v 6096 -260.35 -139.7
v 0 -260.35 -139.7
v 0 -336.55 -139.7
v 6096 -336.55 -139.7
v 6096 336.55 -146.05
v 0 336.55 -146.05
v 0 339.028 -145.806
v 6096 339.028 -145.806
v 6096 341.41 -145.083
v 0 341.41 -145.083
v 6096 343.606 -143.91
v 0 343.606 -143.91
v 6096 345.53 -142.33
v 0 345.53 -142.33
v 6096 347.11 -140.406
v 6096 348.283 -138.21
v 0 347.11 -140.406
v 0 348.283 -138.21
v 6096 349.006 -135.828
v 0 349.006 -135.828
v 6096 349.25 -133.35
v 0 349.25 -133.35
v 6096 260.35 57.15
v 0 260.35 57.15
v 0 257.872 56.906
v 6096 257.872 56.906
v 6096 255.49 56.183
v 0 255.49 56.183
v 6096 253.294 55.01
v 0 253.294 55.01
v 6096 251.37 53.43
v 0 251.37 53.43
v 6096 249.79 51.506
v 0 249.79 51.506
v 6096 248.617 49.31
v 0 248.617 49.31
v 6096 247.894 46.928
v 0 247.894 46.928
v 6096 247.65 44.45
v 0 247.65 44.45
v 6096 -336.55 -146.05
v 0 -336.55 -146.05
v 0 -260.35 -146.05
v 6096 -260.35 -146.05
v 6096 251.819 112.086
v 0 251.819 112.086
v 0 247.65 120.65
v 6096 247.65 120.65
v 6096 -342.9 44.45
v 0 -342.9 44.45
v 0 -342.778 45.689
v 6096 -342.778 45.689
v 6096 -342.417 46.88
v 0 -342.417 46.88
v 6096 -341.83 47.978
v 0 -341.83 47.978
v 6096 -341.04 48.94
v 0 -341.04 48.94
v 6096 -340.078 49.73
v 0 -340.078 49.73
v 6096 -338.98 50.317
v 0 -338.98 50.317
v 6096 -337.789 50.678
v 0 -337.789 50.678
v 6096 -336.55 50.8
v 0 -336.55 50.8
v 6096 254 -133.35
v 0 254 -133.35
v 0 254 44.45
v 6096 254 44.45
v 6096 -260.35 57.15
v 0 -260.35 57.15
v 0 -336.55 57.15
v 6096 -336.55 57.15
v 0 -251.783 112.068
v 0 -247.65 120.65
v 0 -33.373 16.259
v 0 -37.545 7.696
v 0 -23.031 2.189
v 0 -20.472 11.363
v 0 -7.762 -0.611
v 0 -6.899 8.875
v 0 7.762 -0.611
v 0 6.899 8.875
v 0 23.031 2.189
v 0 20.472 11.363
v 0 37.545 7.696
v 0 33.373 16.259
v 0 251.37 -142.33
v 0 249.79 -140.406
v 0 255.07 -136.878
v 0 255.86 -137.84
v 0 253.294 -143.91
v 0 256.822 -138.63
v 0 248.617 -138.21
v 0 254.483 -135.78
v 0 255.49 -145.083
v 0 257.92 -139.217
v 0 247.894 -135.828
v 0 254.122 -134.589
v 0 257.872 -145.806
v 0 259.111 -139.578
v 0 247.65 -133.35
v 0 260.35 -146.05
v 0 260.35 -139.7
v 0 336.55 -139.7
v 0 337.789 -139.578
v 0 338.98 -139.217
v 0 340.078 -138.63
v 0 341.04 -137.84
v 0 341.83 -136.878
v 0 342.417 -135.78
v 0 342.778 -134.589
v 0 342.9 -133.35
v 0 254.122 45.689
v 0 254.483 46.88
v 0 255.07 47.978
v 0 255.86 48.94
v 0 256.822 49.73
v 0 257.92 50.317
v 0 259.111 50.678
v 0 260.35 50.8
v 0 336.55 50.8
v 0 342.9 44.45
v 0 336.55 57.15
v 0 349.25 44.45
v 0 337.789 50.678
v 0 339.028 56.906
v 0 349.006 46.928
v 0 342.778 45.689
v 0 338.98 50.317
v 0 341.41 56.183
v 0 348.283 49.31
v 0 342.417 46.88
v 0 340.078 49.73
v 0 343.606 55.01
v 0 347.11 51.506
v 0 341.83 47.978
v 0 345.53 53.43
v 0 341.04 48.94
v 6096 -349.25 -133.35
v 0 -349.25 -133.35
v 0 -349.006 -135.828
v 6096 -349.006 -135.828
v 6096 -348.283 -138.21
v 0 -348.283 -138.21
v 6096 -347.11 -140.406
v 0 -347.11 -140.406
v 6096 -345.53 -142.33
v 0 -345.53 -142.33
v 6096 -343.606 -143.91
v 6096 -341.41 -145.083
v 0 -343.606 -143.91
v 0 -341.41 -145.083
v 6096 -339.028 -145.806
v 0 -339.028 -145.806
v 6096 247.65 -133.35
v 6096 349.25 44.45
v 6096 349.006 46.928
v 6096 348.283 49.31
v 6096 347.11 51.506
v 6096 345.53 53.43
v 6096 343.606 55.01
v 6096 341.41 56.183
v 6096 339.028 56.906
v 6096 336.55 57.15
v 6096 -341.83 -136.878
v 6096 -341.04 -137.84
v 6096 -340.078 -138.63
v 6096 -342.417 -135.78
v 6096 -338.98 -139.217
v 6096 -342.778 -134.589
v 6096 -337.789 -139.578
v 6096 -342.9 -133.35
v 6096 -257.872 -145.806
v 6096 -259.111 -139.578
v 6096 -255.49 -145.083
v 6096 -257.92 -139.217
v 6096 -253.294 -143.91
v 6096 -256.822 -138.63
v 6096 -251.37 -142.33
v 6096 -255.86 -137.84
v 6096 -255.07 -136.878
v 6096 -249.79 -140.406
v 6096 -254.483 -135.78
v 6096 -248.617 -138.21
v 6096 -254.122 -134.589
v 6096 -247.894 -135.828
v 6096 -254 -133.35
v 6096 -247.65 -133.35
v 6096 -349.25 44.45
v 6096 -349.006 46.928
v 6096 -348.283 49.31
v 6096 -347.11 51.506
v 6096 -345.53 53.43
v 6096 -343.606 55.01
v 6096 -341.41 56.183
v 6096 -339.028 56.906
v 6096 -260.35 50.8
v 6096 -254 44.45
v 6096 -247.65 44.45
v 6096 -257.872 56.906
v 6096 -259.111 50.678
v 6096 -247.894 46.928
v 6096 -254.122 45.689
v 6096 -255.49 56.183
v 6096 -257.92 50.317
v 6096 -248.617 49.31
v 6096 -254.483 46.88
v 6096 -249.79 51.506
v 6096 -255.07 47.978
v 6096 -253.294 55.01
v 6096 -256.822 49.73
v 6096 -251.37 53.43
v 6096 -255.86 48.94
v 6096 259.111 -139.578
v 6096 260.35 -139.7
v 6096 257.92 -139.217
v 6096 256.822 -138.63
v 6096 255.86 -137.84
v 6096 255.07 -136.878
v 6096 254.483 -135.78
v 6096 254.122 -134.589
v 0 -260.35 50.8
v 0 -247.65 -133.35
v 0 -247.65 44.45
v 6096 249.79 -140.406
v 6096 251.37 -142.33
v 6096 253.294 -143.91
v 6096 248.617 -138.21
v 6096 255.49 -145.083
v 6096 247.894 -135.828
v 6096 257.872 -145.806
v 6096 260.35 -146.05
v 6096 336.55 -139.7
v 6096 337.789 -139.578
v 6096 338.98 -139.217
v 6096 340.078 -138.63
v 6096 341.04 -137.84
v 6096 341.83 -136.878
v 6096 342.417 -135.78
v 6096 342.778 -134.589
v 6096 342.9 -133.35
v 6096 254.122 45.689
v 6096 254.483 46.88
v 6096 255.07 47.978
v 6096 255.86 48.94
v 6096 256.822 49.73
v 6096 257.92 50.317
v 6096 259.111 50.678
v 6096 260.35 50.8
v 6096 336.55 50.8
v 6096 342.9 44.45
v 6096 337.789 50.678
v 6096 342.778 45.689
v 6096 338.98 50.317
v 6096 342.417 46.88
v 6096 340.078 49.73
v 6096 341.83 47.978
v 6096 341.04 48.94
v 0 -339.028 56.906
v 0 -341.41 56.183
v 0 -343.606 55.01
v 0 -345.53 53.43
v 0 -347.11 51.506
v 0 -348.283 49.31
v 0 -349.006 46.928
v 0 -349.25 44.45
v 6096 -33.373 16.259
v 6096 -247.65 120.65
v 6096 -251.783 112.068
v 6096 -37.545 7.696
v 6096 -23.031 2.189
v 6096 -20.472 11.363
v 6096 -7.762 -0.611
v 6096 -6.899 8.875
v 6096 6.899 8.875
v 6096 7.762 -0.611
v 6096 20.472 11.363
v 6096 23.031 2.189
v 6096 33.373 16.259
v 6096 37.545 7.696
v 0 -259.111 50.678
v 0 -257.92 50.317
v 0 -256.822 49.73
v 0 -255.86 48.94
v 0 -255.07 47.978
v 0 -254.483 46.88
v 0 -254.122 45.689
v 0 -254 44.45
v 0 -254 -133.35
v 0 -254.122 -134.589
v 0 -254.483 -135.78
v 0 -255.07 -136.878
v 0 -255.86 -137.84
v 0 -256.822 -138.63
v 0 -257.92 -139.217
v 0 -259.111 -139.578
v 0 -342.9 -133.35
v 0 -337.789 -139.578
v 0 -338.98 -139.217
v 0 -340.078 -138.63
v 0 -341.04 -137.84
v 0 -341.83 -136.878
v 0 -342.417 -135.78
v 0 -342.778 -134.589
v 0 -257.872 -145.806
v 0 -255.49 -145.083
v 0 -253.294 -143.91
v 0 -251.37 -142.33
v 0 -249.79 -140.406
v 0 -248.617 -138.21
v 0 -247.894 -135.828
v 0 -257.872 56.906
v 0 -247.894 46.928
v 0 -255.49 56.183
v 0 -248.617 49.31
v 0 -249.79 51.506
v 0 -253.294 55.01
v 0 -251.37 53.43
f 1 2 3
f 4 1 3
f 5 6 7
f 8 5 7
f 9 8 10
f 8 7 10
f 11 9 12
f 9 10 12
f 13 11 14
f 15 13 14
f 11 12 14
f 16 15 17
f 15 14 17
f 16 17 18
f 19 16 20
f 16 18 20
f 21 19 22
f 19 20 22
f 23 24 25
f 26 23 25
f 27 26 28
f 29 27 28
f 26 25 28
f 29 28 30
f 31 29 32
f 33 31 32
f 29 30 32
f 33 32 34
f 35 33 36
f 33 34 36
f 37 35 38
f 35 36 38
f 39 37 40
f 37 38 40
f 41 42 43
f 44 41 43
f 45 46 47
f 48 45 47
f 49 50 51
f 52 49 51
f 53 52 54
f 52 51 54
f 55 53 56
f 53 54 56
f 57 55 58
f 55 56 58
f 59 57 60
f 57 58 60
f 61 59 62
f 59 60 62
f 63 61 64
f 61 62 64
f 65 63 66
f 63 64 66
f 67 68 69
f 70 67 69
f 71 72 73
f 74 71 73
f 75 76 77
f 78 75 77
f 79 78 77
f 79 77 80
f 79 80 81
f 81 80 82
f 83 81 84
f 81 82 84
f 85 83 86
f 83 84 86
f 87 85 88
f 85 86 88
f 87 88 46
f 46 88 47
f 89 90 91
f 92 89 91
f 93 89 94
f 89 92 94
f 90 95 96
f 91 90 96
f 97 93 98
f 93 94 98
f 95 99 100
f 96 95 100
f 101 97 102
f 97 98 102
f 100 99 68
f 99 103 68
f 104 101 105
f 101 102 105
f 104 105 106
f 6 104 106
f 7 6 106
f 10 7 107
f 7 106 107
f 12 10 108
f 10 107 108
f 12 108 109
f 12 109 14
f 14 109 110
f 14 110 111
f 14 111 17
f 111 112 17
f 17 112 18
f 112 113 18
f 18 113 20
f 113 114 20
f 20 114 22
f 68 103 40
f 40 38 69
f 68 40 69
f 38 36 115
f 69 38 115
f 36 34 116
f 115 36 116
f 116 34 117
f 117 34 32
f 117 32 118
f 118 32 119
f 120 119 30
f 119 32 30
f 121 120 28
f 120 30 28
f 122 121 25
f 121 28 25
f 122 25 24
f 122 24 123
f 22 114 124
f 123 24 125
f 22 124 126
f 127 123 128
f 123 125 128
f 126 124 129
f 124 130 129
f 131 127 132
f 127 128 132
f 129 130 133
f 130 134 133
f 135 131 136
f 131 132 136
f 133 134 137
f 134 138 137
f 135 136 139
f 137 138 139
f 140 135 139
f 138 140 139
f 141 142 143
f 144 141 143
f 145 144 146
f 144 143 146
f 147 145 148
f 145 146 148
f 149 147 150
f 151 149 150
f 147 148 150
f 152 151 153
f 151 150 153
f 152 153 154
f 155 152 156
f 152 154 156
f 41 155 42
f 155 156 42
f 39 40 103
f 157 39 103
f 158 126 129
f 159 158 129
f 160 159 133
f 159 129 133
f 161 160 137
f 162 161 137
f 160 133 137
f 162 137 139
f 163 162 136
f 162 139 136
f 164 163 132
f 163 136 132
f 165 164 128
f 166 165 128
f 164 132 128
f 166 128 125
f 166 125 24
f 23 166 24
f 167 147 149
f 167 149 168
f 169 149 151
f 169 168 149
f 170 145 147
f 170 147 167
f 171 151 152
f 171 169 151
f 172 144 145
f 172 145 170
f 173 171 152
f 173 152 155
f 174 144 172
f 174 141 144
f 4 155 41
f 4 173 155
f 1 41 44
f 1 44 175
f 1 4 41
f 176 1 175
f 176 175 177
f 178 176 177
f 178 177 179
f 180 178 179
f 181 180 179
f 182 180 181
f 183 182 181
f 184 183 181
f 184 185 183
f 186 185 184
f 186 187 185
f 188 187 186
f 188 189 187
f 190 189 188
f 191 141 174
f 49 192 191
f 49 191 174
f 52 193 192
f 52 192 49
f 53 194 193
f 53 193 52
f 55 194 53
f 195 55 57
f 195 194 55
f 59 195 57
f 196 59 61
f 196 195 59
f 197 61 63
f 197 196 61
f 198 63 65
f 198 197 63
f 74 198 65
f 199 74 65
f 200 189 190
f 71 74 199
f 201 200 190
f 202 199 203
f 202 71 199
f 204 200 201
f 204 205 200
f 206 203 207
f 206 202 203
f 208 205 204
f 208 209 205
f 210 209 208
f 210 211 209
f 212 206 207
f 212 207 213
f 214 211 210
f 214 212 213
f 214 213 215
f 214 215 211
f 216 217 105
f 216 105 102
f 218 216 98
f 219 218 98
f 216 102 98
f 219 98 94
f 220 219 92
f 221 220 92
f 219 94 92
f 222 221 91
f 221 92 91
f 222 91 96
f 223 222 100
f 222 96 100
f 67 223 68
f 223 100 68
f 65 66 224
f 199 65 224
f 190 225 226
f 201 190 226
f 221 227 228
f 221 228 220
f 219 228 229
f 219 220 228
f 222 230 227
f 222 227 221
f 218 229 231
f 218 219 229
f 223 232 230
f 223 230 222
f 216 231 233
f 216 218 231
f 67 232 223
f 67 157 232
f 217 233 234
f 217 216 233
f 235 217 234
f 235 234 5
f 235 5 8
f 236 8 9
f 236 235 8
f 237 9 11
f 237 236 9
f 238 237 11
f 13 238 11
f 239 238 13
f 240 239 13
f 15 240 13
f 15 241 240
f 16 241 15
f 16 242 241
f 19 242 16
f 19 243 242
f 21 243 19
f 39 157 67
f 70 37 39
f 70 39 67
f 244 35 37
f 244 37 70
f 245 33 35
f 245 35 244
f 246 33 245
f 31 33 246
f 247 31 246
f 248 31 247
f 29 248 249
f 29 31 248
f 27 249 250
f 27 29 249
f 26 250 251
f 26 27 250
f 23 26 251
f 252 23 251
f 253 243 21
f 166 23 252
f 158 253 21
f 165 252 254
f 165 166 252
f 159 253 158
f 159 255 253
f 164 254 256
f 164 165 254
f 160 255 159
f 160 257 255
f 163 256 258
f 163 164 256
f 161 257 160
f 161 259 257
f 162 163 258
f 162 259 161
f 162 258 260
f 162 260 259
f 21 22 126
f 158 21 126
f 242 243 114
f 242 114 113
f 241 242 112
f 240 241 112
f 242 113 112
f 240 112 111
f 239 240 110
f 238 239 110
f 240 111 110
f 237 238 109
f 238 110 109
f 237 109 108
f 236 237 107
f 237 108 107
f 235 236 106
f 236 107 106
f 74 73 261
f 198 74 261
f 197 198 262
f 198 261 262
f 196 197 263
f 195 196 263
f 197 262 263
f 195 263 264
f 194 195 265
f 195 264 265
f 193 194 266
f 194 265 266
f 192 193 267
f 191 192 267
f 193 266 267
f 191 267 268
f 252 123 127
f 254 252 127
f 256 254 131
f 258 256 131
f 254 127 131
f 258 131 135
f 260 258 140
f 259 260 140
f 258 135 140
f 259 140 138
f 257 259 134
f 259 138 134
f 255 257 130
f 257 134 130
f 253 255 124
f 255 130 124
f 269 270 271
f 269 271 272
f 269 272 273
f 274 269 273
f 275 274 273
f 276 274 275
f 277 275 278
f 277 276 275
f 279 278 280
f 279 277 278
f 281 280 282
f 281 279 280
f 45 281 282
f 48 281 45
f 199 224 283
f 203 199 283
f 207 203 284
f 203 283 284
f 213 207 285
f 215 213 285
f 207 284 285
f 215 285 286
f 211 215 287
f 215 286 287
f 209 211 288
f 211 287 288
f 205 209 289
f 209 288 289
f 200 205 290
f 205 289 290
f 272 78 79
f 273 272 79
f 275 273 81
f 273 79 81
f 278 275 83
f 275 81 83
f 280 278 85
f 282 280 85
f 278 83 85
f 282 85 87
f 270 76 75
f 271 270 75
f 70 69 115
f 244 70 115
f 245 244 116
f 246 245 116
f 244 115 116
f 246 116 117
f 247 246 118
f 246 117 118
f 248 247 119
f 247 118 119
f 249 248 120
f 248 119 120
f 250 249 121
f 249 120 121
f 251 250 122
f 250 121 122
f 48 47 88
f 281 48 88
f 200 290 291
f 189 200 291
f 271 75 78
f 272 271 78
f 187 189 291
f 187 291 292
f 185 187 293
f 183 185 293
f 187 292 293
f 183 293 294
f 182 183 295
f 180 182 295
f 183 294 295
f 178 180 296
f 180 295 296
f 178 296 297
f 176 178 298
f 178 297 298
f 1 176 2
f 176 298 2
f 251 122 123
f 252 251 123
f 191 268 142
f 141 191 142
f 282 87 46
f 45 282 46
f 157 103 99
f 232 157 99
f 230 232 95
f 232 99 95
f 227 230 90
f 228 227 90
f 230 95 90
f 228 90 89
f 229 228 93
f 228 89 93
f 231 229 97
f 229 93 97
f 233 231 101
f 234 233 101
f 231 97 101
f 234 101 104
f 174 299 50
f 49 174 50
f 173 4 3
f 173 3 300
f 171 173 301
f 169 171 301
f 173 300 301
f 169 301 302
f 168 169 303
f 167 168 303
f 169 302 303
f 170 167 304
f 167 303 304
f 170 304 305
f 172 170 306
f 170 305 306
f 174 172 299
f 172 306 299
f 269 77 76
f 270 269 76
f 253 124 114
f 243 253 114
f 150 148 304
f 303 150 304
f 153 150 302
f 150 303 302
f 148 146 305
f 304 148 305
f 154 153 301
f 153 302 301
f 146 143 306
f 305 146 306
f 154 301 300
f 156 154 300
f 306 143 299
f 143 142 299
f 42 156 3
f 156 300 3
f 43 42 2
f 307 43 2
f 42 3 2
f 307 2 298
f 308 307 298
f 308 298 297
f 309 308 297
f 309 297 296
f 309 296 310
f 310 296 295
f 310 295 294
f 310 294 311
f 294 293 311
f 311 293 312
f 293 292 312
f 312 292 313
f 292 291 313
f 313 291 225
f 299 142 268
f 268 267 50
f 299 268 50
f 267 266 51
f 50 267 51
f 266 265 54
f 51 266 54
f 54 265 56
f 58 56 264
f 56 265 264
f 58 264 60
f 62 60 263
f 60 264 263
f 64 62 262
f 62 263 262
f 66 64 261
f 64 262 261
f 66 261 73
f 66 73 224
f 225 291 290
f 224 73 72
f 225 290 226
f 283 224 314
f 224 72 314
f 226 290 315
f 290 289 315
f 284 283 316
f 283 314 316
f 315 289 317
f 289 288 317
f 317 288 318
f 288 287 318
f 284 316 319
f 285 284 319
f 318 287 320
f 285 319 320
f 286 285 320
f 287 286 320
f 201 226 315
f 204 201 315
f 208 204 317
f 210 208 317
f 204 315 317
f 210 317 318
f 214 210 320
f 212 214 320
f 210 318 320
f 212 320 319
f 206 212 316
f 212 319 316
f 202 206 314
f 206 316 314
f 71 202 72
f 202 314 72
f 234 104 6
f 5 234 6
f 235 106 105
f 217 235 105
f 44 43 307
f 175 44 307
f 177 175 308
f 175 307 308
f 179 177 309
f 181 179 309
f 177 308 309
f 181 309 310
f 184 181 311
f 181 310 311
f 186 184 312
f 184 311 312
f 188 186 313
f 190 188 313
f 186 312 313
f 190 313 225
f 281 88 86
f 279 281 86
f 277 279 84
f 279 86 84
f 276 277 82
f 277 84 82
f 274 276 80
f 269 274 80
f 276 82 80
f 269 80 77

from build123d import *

# Parameters (mm, degrees)
F1_DEPTH = 6096


with BuildPart() as f1:
    # F0 (on Right) → F1 (new body)
    with BuildSketch(Plane.YZ):
        with BuildLine():
            Line((-260.35, 57.15), (-336.55, 57.15))
            ThreePointArc((-336.55, 57.15), (-345.530256, 53.430256), (-349.25, 44.45))
            Line((-349.25, 44.45), (-349.25, -133.35))
            ThreePointArc((-349.25, -133.35), (-345.530256, -142.330256), (-336.55, -146.05))
            Line((-336.55, -146.05), (-260.35, -146.05))
            ThreePointArc((-260.35, -146.05), (-251.369744, -142.330256), (-247.65, -133.35))
            Line((-247.65, -133.35), (-247.65, 44.45))
            ThreePointArc((-247.65, 44.45), (-251.369744, 53.430256), (-260.35, 57.15))
        make_face()
        with BuildLine():
            ThreePointArc((-342.9, 44.45), (-341.040128, 48.940128), (-336.55, 50.8))
            Line((-336.55, 50.8), (-260.35, 50.8))
            ThreePointArc((-260.35, 50.8), (-255.859872, 48.940128), (-254, 44.45))
            Line((-254, 44.45), (-254, -133.35))
            ThreePointArc((-254, -133.35), (-255.859872, -137.840128), (-260.35, -139.7))
            Line((-260.35, -139.7), (-336.55, -139.7))
            ThreePointArc((-336.55, -139.7), (-341.040128, -137.840128), (-342.9, -133.35))
            Line((-342.9, -133.35), (-342.9, 44.45))
        make_face(mode=Mode.SUBTRACT)
        with BuildLine():
            ThreePointArc((260.35, 57.15), (251.369744, 53.430256), (247.65, 44.45))
            Line((247.65, 44.45), (247.65, -133.35))
            ThreePointArc((247.65, -133.35), (251.369744, -142.330256), (260.35, -146.05))
            Line((260.35, -146.05), (336.55, -146.05))
            ThreePointArc((336.55, -146.05), (345.530256, -142.330256), (349.25, -133.35))
            Line((349.25, -133.35), (349.25, 44.45))
            ThreePointArc((349.25, 44.45), (345.530256, 53.430256), (336.55, 57.15))
            Line((336.55, 57.15), (260.35, 57.15))
        make_face()
        with BuildLine():
            Line((260.35, 50.8), (336.55, 50.8))
            ThreePointArc((336.55, 50.8), (341.040128, 48.940128), (342.9, 44.45))
            Line((342.9, 44.45), (342.9, -133.35))
            ThreePointArc((342.9, -133.35), (341.040128, -137.840128), (336.55, -139.7))
            Line((336.55, -139.7), (260.35, -139.7))
            ThreePointArc((260.35, -139.7), (255.859872, -137.840128), (254, -133.35))
            Line((254, -133.35), (254, 44.45))
            ThreePointArc((254, 44.45), (255.859872, 48.940128), (260.35, 50.8))
        make_face(mode=Mode.SUBTRACT)
        with BuildLine():
            Line((-33.37327, 16.258773), (-247.65, 120.65))
            Line((-247.65, 120.65), (-251.782735, 112.068159))
            Line((-251.782735, 112.068159), (-37.544929, 7.695894))
            ThreePointArc((-37.544929, 7.695894), (0, -0.963199), (37.544929, 7.695894))
            Line((37.544929, 7.695894), (251.819079, 112.085865))
            Line((251.819079, 112.085865), (247.65, 120.65))
            Line((247.65, 120.65), (33.37327, 16.258773))
            ThreePointArc((33.37327, 16.258773), (0, 8.561801), (-33.37327, 16.258773))
        make_face()
    extrude(amount=F1_DEPTH)


solid = f1.part
